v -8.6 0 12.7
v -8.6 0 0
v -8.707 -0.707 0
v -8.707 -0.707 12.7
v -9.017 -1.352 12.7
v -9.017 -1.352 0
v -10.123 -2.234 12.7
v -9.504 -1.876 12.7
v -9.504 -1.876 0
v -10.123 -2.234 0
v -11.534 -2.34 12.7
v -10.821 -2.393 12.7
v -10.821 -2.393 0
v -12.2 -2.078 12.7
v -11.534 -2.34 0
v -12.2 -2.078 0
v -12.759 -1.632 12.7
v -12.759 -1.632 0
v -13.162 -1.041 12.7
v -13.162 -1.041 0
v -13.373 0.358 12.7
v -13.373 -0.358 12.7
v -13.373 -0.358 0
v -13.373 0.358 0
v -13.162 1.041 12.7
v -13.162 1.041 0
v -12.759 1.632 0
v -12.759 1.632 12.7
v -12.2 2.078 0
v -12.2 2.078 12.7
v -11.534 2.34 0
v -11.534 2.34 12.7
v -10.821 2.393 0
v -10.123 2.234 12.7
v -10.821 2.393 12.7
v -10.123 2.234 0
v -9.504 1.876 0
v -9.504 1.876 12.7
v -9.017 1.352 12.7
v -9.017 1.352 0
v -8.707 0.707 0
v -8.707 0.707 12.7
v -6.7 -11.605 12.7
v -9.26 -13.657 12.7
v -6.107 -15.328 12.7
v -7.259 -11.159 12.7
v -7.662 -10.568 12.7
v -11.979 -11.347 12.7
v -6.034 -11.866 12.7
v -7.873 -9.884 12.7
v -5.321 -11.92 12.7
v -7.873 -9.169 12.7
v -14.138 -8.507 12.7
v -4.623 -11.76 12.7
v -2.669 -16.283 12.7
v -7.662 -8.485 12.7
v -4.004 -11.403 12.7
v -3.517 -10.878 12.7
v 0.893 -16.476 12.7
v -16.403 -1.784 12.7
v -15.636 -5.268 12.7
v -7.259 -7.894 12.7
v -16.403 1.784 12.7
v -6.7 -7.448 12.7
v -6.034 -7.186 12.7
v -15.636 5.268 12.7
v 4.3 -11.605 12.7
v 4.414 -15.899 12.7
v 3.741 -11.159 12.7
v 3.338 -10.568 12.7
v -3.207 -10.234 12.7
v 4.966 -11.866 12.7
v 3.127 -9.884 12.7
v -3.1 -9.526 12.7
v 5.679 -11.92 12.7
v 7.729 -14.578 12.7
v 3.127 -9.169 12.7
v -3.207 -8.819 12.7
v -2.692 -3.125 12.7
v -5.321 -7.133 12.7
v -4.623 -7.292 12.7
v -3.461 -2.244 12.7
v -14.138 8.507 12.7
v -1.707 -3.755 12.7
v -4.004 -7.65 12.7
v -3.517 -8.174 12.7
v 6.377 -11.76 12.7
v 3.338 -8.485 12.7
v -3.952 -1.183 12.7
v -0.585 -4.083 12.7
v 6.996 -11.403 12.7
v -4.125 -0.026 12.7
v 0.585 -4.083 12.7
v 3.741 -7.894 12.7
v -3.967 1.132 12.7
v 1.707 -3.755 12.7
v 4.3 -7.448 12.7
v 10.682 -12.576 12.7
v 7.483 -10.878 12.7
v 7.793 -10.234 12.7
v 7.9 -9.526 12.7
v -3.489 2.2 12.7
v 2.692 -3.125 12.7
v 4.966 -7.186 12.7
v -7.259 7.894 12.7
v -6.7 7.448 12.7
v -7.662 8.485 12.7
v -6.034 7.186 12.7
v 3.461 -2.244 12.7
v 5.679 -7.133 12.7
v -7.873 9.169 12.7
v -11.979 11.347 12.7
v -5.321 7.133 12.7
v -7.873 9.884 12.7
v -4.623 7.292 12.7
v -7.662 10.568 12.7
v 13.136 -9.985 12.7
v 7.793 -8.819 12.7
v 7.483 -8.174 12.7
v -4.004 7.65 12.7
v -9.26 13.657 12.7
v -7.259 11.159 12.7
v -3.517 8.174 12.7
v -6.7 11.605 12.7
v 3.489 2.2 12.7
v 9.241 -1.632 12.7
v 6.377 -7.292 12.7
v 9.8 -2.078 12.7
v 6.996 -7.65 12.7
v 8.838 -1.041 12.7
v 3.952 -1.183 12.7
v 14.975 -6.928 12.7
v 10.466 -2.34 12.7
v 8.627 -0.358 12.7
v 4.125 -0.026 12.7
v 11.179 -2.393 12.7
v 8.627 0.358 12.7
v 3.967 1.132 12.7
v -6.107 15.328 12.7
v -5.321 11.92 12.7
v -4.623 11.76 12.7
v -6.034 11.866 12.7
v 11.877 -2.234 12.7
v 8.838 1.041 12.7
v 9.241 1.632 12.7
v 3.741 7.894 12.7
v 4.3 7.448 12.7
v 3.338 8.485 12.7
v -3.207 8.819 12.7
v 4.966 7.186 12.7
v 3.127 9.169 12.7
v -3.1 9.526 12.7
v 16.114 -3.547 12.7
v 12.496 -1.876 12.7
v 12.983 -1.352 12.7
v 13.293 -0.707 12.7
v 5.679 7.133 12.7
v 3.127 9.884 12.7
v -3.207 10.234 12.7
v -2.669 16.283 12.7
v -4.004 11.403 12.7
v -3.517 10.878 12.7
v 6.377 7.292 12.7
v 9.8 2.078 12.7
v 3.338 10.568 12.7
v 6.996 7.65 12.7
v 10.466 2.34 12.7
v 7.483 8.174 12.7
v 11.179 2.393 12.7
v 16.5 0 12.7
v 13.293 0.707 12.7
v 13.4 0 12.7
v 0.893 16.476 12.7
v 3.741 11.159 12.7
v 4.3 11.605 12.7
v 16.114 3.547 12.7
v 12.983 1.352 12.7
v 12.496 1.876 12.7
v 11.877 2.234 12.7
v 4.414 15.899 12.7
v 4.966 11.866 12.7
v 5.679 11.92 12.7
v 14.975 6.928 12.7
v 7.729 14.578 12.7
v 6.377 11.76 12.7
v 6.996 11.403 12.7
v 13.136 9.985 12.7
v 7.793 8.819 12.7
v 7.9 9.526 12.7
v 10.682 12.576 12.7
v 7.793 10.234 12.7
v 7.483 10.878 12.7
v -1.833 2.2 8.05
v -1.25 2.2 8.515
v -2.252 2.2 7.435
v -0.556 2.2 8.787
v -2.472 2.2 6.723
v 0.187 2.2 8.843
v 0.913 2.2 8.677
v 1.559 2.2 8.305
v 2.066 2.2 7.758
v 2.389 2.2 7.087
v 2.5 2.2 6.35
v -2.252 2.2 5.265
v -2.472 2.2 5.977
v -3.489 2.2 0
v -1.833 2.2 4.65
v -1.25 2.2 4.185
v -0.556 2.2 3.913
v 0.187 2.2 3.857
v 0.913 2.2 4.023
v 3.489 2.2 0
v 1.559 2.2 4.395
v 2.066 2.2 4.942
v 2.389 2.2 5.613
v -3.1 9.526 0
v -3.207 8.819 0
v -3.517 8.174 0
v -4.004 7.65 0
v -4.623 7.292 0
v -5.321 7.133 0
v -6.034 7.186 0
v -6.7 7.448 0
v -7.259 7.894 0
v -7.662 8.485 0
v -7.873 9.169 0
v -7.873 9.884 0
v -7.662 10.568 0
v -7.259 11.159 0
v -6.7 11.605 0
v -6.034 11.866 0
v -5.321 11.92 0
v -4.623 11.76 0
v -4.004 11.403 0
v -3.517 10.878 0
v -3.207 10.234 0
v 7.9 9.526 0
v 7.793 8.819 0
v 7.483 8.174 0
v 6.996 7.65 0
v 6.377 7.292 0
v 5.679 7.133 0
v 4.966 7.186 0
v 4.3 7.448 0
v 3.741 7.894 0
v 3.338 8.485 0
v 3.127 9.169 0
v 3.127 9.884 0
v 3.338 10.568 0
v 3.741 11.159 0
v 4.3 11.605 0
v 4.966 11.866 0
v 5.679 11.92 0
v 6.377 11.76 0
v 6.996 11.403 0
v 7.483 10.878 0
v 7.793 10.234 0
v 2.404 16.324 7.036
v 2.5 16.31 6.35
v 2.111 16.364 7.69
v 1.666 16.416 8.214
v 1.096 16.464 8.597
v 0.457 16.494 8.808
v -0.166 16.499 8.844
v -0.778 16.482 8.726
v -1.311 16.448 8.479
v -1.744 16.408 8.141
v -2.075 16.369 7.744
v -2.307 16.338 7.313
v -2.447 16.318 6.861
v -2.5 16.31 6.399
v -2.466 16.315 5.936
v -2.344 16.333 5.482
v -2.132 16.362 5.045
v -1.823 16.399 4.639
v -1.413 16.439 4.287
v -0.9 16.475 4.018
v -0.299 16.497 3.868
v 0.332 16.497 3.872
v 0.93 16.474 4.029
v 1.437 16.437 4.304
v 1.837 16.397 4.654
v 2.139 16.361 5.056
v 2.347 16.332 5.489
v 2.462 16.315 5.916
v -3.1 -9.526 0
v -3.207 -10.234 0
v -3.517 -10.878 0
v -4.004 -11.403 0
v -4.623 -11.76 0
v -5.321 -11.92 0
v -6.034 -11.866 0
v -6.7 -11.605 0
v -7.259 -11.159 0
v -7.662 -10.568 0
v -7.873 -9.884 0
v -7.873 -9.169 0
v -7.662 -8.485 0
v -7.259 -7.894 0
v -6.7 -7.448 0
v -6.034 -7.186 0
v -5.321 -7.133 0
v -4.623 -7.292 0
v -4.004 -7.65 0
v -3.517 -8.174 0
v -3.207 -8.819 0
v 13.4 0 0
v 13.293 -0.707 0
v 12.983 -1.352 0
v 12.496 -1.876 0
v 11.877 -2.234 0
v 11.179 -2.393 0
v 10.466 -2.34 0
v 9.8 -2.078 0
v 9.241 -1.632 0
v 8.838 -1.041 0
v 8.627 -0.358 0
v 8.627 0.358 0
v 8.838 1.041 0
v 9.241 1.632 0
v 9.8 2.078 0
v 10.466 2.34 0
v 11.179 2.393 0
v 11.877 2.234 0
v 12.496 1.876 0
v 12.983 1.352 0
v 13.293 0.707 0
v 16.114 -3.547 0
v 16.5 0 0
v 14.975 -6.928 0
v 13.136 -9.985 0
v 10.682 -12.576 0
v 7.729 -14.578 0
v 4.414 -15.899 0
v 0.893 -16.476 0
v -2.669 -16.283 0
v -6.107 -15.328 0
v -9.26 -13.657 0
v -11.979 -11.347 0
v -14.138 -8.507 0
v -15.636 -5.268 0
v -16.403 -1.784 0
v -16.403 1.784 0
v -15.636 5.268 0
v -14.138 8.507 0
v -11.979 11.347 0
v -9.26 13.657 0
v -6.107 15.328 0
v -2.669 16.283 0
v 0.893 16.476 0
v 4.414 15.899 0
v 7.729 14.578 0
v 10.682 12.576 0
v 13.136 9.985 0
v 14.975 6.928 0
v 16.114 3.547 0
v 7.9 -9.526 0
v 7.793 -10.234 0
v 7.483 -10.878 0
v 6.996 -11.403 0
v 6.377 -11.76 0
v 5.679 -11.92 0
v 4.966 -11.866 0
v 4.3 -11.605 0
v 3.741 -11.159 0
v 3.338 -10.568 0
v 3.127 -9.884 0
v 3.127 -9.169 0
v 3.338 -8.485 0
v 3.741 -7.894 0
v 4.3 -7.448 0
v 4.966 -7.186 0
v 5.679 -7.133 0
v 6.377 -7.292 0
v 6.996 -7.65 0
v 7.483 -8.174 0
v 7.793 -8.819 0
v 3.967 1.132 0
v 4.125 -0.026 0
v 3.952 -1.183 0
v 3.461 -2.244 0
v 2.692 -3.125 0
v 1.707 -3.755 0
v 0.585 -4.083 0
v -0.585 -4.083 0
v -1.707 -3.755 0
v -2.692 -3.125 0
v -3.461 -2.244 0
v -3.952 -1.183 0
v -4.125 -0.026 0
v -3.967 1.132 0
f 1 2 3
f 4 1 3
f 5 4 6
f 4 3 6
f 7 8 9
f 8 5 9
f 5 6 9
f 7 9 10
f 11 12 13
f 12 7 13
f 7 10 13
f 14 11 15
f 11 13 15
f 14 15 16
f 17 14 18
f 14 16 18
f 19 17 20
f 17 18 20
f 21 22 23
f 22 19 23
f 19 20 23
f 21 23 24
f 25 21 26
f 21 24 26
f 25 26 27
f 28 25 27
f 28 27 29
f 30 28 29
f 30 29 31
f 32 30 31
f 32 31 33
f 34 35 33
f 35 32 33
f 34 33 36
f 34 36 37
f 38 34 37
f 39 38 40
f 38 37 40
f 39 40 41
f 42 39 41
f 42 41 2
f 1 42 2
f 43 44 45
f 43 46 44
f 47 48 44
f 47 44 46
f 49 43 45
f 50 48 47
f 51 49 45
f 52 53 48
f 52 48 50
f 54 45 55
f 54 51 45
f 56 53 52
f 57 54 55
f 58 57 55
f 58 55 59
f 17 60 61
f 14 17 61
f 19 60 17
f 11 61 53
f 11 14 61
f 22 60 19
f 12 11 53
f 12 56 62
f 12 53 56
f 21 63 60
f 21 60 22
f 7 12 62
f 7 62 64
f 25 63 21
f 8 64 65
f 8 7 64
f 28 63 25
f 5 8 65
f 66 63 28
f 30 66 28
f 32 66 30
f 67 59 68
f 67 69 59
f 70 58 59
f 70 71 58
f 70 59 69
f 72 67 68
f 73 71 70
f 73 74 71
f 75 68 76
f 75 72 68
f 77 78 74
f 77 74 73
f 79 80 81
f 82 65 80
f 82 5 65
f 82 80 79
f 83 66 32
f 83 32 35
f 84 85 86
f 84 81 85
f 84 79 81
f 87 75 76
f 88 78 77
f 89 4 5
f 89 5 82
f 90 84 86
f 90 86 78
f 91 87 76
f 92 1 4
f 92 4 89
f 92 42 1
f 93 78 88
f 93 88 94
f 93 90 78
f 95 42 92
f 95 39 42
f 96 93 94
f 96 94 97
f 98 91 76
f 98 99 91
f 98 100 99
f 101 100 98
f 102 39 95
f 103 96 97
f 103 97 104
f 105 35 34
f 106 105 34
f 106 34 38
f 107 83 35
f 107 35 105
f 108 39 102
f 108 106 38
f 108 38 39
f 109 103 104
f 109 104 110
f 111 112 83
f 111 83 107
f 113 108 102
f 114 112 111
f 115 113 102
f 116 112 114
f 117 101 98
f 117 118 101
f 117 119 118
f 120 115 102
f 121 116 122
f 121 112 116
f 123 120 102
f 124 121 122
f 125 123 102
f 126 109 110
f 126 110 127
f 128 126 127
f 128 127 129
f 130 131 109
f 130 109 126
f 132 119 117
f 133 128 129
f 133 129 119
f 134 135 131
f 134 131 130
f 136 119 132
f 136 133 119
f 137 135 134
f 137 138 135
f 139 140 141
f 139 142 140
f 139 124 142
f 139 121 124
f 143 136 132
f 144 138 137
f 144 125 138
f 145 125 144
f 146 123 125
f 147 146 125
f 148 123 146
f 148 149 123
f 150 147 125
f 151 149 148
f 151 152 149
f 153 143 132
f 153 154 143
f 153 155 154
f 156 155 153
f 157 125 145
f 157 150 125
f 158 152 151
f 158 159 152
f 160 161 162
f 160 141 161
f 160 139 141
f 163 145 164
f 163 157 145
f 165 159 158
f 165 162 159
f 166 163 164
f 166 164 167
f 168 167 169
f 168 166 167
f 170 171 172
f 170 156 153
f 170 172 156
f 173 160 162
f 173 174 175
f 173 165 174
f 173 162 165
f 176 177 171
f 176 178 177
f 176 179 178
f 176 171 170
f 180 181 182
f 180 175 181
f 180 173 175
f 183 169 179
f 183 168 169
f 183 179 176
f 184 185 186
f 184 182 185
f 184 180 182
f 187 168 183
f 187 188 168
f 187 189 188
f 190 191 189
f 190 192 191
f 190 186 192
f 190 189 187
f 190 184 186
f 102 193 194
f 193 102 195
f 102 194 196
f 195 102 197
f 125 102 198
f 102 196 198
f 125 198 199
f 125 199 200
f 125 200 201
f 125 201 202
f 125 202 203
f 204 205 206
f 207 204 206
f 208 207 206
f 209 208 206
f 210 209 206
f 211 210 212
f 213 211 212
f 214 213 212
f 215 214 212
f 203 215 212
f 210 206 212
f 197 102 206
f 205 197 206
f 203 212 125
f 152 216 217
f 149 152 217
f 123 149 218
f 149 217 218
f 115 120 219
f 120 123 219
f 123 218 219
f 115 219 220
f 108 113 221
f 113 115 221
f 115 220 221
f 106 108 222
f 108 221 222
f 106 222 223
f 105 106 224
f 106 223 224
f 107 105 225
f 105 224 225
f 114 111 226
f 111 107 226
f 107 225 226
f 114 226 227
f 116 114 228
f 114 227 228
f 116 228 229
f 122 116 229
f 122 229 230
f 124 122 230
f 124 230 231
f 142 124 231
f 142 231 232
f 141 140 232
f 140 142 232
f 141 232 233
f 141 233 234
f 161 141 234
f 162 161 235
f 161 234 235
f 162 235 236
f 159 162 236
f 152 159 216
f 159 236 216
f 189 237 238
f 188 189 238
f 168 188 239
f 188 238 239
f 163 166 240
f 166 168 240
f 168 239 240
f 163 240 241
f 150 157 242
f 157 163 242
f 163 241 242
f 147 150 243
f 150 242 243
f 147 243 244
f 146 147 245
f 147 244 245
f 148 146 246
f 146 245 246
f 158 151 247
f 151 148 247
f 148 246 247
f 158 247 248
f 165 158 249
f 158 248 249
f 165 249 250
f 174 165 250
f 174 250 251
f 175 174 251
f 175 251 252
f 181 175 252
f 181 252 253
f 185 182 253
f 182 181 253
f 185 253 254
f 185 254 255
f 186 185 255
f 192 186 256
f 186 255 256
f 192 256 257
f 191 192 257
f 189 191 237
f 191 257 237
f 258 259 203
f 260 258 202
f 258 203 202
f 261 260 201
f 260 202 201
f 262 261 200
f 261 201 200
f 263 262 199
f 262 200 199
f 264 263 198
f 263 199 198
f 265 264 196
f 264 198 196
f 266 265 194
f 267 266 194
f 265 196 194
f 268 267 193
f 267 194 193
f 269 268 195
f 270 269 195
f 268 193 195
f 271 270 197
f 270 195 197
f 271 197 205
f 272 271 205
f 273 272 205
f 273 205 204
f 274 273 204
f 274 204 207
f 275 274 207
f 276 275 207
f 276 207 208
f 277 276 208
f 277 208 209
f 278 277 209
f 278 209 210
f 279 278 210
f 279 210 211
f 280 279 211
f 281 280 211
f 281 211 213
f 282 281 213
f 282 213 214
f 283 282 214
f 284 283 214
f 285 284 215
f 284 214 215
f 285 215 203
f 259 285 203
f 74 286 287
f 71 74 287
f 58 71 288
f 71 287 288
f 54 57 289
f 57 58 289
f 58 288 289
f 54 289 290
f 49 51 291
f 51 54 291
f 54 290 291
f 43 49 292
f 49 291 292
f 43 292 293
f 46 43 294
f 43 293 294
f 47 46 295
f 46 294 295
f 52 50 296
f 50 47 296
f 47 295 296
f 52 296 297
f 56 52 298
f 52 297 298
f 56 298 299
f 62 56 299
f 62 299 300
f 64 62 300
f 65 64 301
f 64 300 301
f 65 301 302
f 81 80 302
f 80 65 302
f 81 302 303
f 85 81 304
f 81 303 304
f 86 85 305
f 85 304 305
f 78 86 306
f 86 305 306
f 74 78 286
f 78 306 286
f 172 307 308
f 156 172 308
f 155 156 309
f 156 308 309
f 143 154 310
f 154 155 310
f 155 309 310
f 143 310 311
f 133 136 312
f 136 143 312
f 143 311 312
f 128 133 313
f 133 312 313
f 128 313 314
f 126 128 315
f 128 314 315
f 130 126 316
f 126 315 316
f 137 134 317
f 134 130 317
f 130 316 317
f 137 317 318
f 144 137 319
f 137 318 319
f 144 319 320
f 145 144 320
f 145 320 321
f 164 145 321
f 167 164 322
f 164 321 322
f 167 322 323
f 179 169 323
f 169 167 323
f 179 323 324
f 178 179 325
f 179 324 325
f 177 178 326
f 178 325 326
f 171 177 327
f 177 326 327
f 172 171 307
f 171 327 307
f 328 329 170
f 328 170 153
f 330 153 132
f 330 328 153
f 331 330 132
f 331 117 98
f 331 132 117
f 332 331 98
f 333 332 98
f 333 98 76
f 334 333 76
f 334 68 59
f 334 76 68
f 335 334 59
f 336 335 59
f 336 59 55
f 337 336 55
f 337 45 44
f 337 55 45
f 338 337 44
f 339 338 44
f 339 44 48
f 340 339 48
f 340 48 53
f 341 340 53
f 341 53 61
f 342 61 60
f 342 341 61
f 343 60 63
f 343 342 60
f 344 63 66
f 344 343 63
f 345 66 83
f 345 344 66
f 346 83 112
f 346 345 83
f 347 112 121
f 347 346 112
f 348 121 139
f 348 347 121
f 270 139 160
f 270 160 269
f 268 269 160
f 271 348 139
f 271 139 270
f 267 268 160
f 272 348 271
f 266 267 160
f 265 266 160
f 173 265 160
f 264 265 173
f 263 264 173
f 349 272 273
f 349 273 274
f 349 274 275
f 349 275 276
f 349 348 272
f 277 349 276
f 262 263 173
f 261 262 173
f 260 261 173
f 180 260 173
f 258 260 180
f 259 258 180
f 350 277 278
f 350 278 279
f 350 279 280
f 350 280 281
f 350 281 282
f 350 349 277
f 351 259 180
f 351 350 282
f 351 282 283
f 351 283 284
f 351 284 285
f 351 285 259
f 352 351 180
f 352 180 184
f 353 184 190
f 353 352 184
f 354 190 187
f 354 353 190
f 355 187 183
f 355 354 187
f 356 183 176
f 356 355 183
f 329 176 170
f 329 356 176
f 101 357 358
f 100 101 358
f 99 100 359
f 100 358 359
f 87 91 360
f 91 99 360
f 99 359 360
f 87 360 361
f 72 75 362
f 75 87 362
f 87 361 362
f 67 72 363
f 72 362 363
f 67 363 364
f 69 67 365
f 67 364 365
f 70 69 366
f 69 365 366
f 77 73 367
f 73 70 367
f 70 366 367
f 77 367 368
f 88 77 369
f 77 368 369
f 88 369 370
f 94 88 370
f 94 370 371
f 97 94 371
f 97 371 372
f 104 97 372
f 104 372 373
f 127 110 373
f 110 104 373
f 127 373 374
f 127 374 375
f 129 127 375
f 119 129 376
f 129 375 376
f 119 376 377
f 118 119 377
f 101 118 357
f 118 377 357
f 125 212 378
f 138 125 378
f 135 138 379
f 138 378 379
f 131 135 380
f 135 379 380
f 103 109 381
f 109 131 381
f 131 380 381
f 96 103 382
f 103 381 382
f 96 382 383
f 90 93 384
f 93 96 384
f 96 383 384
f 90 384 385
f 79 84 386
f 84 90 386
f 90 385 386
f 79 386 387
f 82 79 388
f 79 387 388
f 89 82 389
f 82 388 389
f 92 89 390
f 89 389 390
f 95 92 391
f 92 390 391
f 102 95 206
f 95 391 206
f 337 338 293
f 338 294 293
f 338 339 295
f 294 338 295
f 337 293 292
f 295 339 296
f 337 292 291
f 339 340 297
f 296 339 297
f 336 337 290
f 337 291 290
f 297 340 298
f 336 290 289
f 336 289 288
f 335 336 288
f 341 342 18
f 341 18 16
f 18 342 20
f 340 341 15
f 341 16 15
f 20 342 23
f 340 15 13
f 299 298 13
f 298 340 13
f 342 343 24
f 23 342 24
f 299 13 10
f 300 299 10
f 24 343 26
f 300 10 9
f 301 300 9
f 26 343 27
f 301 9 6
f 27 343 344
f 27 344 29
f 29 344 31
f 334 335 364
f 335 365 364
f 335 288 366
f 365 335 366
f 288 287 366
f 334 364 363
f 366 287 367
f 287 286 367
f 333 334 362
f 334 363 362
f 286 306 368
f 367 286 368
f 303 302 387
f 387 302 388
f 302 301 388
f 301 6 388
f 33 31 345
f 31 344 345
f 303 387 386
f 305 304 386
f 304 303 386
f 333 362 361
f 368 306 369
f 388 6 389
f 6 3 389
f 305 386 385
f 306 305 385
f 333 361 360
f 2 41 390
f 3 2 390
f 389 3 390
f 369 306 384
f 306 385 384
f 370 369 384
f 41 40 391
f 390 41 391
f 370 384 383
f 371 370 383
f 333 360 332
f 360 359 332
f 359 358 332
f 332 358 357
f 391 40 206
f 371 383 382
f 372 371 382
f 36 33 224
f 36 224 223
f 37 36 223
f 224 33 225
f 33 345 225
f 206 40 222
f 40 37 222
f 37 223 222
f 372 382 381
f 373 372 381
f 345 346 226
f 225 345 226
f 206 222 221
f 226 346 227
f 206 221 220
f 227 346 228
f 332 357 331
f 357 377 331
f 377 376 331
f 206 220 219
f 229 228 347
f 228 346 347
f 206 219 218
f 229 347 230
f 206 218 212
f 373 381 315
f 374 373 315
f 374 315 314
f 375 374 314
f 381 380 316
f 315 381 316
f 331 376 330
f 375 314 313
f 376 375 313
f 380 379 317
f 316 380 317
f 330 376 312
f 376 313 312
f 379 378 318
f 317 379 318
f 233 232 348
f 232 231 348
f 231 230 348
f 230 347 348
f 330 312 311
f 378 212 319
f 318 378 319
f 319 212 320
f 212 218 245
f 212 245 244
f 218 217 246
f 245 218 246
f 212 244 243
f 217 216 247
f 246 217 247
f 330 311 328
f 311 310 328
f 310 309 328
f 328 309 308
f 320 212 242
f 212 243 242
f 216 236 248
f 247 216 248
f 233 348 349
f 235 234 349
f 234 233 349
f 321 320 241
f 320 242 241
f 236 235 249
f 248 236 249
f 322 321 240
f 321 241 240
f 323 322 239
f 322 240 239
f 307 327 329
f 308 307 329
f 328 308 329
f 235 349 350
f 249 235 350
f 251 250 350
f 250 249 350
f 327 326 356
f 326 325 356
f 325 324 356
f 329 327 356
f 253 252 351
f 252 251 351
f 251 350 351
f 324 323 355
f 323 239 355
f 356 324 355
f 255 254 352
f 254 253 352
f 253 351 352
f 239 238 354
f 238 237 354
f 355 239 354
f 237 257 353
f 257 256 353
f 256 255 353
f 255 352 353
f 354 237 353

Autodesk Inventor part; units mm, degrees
ref_plane "YZ Plane" through (0, 0, 0) normal (1, 0, 0) x (0, 1, 0)
ref_plane "XZ Plane" through (0, 0, 0) normal (0, 1, 0) x (-1, 0, 0)
ref_plane "XY Plane" through (0, 0, 0) normal (0, 0, 1) x (1, 0, 0)
sketch "Sketch9" plane through (0, 0, 0) normal (0, 0, 1) x (1, 0, 0)
  circle A0 centre (0, 0) radius 4.125 construction
  circle A1 centre (0, 0) radius 16.5
  circle A2 centre (11, 0) radius 2.4
  circle A3 centre (5.5, 9.5263) radius 2.4
  circle A4 centre (-5.5, 9.5263) radius 2.4
  line L0 (-3.4894, 2.2) -> (3.4894, 2.2)
  arc A5 (-3.4894, 2.2) -> (3.4894, 2.2) centre (0, 0) ccw
  circle A6 centre (-11, 0) radius 2.4
  circle A7 centre (-5.5, -9.5263) radius 2.4
  circle A8 centre (5.5, -9.5263) radius 2.4
  dimension "d25" = 8.25
  dimension "d26" = 33
  dimension "d27" = 4.8
  dimension "d31" = 360
  dimension "d33" = 2.2
  dimension "d36" = 11
extrude "Extrusion8" add sketch "Sketch9" along normal blind 12.7
sketch "Sketch10" plane through (-3.4894, 2.2, 0) normal (0, -1, 0) x (1, 0, 0)
  line L0 (6.9787, 0) -> (0, 0) projected
  line L1 (6.9787, 0) -> (6.9787, 12.7) projected
  line L2 (0, 12.7) -> (6.9787, 12.7) projected
  line L3 (0, 0) -> (0, 12.7) projected
  circle A0 centre (3.4894, 6.35) radius 2.5
  point P0 (3.4894, 0)
  point P1 (3.4894, 12.7)
  point P2 (0, 6.35)
  dimension "d37" = 5
extrude "Extrusion9" cut sketch "Sketch10" against normal through all contours A0
properties part number "AA055" material "Aluminum 6061"
